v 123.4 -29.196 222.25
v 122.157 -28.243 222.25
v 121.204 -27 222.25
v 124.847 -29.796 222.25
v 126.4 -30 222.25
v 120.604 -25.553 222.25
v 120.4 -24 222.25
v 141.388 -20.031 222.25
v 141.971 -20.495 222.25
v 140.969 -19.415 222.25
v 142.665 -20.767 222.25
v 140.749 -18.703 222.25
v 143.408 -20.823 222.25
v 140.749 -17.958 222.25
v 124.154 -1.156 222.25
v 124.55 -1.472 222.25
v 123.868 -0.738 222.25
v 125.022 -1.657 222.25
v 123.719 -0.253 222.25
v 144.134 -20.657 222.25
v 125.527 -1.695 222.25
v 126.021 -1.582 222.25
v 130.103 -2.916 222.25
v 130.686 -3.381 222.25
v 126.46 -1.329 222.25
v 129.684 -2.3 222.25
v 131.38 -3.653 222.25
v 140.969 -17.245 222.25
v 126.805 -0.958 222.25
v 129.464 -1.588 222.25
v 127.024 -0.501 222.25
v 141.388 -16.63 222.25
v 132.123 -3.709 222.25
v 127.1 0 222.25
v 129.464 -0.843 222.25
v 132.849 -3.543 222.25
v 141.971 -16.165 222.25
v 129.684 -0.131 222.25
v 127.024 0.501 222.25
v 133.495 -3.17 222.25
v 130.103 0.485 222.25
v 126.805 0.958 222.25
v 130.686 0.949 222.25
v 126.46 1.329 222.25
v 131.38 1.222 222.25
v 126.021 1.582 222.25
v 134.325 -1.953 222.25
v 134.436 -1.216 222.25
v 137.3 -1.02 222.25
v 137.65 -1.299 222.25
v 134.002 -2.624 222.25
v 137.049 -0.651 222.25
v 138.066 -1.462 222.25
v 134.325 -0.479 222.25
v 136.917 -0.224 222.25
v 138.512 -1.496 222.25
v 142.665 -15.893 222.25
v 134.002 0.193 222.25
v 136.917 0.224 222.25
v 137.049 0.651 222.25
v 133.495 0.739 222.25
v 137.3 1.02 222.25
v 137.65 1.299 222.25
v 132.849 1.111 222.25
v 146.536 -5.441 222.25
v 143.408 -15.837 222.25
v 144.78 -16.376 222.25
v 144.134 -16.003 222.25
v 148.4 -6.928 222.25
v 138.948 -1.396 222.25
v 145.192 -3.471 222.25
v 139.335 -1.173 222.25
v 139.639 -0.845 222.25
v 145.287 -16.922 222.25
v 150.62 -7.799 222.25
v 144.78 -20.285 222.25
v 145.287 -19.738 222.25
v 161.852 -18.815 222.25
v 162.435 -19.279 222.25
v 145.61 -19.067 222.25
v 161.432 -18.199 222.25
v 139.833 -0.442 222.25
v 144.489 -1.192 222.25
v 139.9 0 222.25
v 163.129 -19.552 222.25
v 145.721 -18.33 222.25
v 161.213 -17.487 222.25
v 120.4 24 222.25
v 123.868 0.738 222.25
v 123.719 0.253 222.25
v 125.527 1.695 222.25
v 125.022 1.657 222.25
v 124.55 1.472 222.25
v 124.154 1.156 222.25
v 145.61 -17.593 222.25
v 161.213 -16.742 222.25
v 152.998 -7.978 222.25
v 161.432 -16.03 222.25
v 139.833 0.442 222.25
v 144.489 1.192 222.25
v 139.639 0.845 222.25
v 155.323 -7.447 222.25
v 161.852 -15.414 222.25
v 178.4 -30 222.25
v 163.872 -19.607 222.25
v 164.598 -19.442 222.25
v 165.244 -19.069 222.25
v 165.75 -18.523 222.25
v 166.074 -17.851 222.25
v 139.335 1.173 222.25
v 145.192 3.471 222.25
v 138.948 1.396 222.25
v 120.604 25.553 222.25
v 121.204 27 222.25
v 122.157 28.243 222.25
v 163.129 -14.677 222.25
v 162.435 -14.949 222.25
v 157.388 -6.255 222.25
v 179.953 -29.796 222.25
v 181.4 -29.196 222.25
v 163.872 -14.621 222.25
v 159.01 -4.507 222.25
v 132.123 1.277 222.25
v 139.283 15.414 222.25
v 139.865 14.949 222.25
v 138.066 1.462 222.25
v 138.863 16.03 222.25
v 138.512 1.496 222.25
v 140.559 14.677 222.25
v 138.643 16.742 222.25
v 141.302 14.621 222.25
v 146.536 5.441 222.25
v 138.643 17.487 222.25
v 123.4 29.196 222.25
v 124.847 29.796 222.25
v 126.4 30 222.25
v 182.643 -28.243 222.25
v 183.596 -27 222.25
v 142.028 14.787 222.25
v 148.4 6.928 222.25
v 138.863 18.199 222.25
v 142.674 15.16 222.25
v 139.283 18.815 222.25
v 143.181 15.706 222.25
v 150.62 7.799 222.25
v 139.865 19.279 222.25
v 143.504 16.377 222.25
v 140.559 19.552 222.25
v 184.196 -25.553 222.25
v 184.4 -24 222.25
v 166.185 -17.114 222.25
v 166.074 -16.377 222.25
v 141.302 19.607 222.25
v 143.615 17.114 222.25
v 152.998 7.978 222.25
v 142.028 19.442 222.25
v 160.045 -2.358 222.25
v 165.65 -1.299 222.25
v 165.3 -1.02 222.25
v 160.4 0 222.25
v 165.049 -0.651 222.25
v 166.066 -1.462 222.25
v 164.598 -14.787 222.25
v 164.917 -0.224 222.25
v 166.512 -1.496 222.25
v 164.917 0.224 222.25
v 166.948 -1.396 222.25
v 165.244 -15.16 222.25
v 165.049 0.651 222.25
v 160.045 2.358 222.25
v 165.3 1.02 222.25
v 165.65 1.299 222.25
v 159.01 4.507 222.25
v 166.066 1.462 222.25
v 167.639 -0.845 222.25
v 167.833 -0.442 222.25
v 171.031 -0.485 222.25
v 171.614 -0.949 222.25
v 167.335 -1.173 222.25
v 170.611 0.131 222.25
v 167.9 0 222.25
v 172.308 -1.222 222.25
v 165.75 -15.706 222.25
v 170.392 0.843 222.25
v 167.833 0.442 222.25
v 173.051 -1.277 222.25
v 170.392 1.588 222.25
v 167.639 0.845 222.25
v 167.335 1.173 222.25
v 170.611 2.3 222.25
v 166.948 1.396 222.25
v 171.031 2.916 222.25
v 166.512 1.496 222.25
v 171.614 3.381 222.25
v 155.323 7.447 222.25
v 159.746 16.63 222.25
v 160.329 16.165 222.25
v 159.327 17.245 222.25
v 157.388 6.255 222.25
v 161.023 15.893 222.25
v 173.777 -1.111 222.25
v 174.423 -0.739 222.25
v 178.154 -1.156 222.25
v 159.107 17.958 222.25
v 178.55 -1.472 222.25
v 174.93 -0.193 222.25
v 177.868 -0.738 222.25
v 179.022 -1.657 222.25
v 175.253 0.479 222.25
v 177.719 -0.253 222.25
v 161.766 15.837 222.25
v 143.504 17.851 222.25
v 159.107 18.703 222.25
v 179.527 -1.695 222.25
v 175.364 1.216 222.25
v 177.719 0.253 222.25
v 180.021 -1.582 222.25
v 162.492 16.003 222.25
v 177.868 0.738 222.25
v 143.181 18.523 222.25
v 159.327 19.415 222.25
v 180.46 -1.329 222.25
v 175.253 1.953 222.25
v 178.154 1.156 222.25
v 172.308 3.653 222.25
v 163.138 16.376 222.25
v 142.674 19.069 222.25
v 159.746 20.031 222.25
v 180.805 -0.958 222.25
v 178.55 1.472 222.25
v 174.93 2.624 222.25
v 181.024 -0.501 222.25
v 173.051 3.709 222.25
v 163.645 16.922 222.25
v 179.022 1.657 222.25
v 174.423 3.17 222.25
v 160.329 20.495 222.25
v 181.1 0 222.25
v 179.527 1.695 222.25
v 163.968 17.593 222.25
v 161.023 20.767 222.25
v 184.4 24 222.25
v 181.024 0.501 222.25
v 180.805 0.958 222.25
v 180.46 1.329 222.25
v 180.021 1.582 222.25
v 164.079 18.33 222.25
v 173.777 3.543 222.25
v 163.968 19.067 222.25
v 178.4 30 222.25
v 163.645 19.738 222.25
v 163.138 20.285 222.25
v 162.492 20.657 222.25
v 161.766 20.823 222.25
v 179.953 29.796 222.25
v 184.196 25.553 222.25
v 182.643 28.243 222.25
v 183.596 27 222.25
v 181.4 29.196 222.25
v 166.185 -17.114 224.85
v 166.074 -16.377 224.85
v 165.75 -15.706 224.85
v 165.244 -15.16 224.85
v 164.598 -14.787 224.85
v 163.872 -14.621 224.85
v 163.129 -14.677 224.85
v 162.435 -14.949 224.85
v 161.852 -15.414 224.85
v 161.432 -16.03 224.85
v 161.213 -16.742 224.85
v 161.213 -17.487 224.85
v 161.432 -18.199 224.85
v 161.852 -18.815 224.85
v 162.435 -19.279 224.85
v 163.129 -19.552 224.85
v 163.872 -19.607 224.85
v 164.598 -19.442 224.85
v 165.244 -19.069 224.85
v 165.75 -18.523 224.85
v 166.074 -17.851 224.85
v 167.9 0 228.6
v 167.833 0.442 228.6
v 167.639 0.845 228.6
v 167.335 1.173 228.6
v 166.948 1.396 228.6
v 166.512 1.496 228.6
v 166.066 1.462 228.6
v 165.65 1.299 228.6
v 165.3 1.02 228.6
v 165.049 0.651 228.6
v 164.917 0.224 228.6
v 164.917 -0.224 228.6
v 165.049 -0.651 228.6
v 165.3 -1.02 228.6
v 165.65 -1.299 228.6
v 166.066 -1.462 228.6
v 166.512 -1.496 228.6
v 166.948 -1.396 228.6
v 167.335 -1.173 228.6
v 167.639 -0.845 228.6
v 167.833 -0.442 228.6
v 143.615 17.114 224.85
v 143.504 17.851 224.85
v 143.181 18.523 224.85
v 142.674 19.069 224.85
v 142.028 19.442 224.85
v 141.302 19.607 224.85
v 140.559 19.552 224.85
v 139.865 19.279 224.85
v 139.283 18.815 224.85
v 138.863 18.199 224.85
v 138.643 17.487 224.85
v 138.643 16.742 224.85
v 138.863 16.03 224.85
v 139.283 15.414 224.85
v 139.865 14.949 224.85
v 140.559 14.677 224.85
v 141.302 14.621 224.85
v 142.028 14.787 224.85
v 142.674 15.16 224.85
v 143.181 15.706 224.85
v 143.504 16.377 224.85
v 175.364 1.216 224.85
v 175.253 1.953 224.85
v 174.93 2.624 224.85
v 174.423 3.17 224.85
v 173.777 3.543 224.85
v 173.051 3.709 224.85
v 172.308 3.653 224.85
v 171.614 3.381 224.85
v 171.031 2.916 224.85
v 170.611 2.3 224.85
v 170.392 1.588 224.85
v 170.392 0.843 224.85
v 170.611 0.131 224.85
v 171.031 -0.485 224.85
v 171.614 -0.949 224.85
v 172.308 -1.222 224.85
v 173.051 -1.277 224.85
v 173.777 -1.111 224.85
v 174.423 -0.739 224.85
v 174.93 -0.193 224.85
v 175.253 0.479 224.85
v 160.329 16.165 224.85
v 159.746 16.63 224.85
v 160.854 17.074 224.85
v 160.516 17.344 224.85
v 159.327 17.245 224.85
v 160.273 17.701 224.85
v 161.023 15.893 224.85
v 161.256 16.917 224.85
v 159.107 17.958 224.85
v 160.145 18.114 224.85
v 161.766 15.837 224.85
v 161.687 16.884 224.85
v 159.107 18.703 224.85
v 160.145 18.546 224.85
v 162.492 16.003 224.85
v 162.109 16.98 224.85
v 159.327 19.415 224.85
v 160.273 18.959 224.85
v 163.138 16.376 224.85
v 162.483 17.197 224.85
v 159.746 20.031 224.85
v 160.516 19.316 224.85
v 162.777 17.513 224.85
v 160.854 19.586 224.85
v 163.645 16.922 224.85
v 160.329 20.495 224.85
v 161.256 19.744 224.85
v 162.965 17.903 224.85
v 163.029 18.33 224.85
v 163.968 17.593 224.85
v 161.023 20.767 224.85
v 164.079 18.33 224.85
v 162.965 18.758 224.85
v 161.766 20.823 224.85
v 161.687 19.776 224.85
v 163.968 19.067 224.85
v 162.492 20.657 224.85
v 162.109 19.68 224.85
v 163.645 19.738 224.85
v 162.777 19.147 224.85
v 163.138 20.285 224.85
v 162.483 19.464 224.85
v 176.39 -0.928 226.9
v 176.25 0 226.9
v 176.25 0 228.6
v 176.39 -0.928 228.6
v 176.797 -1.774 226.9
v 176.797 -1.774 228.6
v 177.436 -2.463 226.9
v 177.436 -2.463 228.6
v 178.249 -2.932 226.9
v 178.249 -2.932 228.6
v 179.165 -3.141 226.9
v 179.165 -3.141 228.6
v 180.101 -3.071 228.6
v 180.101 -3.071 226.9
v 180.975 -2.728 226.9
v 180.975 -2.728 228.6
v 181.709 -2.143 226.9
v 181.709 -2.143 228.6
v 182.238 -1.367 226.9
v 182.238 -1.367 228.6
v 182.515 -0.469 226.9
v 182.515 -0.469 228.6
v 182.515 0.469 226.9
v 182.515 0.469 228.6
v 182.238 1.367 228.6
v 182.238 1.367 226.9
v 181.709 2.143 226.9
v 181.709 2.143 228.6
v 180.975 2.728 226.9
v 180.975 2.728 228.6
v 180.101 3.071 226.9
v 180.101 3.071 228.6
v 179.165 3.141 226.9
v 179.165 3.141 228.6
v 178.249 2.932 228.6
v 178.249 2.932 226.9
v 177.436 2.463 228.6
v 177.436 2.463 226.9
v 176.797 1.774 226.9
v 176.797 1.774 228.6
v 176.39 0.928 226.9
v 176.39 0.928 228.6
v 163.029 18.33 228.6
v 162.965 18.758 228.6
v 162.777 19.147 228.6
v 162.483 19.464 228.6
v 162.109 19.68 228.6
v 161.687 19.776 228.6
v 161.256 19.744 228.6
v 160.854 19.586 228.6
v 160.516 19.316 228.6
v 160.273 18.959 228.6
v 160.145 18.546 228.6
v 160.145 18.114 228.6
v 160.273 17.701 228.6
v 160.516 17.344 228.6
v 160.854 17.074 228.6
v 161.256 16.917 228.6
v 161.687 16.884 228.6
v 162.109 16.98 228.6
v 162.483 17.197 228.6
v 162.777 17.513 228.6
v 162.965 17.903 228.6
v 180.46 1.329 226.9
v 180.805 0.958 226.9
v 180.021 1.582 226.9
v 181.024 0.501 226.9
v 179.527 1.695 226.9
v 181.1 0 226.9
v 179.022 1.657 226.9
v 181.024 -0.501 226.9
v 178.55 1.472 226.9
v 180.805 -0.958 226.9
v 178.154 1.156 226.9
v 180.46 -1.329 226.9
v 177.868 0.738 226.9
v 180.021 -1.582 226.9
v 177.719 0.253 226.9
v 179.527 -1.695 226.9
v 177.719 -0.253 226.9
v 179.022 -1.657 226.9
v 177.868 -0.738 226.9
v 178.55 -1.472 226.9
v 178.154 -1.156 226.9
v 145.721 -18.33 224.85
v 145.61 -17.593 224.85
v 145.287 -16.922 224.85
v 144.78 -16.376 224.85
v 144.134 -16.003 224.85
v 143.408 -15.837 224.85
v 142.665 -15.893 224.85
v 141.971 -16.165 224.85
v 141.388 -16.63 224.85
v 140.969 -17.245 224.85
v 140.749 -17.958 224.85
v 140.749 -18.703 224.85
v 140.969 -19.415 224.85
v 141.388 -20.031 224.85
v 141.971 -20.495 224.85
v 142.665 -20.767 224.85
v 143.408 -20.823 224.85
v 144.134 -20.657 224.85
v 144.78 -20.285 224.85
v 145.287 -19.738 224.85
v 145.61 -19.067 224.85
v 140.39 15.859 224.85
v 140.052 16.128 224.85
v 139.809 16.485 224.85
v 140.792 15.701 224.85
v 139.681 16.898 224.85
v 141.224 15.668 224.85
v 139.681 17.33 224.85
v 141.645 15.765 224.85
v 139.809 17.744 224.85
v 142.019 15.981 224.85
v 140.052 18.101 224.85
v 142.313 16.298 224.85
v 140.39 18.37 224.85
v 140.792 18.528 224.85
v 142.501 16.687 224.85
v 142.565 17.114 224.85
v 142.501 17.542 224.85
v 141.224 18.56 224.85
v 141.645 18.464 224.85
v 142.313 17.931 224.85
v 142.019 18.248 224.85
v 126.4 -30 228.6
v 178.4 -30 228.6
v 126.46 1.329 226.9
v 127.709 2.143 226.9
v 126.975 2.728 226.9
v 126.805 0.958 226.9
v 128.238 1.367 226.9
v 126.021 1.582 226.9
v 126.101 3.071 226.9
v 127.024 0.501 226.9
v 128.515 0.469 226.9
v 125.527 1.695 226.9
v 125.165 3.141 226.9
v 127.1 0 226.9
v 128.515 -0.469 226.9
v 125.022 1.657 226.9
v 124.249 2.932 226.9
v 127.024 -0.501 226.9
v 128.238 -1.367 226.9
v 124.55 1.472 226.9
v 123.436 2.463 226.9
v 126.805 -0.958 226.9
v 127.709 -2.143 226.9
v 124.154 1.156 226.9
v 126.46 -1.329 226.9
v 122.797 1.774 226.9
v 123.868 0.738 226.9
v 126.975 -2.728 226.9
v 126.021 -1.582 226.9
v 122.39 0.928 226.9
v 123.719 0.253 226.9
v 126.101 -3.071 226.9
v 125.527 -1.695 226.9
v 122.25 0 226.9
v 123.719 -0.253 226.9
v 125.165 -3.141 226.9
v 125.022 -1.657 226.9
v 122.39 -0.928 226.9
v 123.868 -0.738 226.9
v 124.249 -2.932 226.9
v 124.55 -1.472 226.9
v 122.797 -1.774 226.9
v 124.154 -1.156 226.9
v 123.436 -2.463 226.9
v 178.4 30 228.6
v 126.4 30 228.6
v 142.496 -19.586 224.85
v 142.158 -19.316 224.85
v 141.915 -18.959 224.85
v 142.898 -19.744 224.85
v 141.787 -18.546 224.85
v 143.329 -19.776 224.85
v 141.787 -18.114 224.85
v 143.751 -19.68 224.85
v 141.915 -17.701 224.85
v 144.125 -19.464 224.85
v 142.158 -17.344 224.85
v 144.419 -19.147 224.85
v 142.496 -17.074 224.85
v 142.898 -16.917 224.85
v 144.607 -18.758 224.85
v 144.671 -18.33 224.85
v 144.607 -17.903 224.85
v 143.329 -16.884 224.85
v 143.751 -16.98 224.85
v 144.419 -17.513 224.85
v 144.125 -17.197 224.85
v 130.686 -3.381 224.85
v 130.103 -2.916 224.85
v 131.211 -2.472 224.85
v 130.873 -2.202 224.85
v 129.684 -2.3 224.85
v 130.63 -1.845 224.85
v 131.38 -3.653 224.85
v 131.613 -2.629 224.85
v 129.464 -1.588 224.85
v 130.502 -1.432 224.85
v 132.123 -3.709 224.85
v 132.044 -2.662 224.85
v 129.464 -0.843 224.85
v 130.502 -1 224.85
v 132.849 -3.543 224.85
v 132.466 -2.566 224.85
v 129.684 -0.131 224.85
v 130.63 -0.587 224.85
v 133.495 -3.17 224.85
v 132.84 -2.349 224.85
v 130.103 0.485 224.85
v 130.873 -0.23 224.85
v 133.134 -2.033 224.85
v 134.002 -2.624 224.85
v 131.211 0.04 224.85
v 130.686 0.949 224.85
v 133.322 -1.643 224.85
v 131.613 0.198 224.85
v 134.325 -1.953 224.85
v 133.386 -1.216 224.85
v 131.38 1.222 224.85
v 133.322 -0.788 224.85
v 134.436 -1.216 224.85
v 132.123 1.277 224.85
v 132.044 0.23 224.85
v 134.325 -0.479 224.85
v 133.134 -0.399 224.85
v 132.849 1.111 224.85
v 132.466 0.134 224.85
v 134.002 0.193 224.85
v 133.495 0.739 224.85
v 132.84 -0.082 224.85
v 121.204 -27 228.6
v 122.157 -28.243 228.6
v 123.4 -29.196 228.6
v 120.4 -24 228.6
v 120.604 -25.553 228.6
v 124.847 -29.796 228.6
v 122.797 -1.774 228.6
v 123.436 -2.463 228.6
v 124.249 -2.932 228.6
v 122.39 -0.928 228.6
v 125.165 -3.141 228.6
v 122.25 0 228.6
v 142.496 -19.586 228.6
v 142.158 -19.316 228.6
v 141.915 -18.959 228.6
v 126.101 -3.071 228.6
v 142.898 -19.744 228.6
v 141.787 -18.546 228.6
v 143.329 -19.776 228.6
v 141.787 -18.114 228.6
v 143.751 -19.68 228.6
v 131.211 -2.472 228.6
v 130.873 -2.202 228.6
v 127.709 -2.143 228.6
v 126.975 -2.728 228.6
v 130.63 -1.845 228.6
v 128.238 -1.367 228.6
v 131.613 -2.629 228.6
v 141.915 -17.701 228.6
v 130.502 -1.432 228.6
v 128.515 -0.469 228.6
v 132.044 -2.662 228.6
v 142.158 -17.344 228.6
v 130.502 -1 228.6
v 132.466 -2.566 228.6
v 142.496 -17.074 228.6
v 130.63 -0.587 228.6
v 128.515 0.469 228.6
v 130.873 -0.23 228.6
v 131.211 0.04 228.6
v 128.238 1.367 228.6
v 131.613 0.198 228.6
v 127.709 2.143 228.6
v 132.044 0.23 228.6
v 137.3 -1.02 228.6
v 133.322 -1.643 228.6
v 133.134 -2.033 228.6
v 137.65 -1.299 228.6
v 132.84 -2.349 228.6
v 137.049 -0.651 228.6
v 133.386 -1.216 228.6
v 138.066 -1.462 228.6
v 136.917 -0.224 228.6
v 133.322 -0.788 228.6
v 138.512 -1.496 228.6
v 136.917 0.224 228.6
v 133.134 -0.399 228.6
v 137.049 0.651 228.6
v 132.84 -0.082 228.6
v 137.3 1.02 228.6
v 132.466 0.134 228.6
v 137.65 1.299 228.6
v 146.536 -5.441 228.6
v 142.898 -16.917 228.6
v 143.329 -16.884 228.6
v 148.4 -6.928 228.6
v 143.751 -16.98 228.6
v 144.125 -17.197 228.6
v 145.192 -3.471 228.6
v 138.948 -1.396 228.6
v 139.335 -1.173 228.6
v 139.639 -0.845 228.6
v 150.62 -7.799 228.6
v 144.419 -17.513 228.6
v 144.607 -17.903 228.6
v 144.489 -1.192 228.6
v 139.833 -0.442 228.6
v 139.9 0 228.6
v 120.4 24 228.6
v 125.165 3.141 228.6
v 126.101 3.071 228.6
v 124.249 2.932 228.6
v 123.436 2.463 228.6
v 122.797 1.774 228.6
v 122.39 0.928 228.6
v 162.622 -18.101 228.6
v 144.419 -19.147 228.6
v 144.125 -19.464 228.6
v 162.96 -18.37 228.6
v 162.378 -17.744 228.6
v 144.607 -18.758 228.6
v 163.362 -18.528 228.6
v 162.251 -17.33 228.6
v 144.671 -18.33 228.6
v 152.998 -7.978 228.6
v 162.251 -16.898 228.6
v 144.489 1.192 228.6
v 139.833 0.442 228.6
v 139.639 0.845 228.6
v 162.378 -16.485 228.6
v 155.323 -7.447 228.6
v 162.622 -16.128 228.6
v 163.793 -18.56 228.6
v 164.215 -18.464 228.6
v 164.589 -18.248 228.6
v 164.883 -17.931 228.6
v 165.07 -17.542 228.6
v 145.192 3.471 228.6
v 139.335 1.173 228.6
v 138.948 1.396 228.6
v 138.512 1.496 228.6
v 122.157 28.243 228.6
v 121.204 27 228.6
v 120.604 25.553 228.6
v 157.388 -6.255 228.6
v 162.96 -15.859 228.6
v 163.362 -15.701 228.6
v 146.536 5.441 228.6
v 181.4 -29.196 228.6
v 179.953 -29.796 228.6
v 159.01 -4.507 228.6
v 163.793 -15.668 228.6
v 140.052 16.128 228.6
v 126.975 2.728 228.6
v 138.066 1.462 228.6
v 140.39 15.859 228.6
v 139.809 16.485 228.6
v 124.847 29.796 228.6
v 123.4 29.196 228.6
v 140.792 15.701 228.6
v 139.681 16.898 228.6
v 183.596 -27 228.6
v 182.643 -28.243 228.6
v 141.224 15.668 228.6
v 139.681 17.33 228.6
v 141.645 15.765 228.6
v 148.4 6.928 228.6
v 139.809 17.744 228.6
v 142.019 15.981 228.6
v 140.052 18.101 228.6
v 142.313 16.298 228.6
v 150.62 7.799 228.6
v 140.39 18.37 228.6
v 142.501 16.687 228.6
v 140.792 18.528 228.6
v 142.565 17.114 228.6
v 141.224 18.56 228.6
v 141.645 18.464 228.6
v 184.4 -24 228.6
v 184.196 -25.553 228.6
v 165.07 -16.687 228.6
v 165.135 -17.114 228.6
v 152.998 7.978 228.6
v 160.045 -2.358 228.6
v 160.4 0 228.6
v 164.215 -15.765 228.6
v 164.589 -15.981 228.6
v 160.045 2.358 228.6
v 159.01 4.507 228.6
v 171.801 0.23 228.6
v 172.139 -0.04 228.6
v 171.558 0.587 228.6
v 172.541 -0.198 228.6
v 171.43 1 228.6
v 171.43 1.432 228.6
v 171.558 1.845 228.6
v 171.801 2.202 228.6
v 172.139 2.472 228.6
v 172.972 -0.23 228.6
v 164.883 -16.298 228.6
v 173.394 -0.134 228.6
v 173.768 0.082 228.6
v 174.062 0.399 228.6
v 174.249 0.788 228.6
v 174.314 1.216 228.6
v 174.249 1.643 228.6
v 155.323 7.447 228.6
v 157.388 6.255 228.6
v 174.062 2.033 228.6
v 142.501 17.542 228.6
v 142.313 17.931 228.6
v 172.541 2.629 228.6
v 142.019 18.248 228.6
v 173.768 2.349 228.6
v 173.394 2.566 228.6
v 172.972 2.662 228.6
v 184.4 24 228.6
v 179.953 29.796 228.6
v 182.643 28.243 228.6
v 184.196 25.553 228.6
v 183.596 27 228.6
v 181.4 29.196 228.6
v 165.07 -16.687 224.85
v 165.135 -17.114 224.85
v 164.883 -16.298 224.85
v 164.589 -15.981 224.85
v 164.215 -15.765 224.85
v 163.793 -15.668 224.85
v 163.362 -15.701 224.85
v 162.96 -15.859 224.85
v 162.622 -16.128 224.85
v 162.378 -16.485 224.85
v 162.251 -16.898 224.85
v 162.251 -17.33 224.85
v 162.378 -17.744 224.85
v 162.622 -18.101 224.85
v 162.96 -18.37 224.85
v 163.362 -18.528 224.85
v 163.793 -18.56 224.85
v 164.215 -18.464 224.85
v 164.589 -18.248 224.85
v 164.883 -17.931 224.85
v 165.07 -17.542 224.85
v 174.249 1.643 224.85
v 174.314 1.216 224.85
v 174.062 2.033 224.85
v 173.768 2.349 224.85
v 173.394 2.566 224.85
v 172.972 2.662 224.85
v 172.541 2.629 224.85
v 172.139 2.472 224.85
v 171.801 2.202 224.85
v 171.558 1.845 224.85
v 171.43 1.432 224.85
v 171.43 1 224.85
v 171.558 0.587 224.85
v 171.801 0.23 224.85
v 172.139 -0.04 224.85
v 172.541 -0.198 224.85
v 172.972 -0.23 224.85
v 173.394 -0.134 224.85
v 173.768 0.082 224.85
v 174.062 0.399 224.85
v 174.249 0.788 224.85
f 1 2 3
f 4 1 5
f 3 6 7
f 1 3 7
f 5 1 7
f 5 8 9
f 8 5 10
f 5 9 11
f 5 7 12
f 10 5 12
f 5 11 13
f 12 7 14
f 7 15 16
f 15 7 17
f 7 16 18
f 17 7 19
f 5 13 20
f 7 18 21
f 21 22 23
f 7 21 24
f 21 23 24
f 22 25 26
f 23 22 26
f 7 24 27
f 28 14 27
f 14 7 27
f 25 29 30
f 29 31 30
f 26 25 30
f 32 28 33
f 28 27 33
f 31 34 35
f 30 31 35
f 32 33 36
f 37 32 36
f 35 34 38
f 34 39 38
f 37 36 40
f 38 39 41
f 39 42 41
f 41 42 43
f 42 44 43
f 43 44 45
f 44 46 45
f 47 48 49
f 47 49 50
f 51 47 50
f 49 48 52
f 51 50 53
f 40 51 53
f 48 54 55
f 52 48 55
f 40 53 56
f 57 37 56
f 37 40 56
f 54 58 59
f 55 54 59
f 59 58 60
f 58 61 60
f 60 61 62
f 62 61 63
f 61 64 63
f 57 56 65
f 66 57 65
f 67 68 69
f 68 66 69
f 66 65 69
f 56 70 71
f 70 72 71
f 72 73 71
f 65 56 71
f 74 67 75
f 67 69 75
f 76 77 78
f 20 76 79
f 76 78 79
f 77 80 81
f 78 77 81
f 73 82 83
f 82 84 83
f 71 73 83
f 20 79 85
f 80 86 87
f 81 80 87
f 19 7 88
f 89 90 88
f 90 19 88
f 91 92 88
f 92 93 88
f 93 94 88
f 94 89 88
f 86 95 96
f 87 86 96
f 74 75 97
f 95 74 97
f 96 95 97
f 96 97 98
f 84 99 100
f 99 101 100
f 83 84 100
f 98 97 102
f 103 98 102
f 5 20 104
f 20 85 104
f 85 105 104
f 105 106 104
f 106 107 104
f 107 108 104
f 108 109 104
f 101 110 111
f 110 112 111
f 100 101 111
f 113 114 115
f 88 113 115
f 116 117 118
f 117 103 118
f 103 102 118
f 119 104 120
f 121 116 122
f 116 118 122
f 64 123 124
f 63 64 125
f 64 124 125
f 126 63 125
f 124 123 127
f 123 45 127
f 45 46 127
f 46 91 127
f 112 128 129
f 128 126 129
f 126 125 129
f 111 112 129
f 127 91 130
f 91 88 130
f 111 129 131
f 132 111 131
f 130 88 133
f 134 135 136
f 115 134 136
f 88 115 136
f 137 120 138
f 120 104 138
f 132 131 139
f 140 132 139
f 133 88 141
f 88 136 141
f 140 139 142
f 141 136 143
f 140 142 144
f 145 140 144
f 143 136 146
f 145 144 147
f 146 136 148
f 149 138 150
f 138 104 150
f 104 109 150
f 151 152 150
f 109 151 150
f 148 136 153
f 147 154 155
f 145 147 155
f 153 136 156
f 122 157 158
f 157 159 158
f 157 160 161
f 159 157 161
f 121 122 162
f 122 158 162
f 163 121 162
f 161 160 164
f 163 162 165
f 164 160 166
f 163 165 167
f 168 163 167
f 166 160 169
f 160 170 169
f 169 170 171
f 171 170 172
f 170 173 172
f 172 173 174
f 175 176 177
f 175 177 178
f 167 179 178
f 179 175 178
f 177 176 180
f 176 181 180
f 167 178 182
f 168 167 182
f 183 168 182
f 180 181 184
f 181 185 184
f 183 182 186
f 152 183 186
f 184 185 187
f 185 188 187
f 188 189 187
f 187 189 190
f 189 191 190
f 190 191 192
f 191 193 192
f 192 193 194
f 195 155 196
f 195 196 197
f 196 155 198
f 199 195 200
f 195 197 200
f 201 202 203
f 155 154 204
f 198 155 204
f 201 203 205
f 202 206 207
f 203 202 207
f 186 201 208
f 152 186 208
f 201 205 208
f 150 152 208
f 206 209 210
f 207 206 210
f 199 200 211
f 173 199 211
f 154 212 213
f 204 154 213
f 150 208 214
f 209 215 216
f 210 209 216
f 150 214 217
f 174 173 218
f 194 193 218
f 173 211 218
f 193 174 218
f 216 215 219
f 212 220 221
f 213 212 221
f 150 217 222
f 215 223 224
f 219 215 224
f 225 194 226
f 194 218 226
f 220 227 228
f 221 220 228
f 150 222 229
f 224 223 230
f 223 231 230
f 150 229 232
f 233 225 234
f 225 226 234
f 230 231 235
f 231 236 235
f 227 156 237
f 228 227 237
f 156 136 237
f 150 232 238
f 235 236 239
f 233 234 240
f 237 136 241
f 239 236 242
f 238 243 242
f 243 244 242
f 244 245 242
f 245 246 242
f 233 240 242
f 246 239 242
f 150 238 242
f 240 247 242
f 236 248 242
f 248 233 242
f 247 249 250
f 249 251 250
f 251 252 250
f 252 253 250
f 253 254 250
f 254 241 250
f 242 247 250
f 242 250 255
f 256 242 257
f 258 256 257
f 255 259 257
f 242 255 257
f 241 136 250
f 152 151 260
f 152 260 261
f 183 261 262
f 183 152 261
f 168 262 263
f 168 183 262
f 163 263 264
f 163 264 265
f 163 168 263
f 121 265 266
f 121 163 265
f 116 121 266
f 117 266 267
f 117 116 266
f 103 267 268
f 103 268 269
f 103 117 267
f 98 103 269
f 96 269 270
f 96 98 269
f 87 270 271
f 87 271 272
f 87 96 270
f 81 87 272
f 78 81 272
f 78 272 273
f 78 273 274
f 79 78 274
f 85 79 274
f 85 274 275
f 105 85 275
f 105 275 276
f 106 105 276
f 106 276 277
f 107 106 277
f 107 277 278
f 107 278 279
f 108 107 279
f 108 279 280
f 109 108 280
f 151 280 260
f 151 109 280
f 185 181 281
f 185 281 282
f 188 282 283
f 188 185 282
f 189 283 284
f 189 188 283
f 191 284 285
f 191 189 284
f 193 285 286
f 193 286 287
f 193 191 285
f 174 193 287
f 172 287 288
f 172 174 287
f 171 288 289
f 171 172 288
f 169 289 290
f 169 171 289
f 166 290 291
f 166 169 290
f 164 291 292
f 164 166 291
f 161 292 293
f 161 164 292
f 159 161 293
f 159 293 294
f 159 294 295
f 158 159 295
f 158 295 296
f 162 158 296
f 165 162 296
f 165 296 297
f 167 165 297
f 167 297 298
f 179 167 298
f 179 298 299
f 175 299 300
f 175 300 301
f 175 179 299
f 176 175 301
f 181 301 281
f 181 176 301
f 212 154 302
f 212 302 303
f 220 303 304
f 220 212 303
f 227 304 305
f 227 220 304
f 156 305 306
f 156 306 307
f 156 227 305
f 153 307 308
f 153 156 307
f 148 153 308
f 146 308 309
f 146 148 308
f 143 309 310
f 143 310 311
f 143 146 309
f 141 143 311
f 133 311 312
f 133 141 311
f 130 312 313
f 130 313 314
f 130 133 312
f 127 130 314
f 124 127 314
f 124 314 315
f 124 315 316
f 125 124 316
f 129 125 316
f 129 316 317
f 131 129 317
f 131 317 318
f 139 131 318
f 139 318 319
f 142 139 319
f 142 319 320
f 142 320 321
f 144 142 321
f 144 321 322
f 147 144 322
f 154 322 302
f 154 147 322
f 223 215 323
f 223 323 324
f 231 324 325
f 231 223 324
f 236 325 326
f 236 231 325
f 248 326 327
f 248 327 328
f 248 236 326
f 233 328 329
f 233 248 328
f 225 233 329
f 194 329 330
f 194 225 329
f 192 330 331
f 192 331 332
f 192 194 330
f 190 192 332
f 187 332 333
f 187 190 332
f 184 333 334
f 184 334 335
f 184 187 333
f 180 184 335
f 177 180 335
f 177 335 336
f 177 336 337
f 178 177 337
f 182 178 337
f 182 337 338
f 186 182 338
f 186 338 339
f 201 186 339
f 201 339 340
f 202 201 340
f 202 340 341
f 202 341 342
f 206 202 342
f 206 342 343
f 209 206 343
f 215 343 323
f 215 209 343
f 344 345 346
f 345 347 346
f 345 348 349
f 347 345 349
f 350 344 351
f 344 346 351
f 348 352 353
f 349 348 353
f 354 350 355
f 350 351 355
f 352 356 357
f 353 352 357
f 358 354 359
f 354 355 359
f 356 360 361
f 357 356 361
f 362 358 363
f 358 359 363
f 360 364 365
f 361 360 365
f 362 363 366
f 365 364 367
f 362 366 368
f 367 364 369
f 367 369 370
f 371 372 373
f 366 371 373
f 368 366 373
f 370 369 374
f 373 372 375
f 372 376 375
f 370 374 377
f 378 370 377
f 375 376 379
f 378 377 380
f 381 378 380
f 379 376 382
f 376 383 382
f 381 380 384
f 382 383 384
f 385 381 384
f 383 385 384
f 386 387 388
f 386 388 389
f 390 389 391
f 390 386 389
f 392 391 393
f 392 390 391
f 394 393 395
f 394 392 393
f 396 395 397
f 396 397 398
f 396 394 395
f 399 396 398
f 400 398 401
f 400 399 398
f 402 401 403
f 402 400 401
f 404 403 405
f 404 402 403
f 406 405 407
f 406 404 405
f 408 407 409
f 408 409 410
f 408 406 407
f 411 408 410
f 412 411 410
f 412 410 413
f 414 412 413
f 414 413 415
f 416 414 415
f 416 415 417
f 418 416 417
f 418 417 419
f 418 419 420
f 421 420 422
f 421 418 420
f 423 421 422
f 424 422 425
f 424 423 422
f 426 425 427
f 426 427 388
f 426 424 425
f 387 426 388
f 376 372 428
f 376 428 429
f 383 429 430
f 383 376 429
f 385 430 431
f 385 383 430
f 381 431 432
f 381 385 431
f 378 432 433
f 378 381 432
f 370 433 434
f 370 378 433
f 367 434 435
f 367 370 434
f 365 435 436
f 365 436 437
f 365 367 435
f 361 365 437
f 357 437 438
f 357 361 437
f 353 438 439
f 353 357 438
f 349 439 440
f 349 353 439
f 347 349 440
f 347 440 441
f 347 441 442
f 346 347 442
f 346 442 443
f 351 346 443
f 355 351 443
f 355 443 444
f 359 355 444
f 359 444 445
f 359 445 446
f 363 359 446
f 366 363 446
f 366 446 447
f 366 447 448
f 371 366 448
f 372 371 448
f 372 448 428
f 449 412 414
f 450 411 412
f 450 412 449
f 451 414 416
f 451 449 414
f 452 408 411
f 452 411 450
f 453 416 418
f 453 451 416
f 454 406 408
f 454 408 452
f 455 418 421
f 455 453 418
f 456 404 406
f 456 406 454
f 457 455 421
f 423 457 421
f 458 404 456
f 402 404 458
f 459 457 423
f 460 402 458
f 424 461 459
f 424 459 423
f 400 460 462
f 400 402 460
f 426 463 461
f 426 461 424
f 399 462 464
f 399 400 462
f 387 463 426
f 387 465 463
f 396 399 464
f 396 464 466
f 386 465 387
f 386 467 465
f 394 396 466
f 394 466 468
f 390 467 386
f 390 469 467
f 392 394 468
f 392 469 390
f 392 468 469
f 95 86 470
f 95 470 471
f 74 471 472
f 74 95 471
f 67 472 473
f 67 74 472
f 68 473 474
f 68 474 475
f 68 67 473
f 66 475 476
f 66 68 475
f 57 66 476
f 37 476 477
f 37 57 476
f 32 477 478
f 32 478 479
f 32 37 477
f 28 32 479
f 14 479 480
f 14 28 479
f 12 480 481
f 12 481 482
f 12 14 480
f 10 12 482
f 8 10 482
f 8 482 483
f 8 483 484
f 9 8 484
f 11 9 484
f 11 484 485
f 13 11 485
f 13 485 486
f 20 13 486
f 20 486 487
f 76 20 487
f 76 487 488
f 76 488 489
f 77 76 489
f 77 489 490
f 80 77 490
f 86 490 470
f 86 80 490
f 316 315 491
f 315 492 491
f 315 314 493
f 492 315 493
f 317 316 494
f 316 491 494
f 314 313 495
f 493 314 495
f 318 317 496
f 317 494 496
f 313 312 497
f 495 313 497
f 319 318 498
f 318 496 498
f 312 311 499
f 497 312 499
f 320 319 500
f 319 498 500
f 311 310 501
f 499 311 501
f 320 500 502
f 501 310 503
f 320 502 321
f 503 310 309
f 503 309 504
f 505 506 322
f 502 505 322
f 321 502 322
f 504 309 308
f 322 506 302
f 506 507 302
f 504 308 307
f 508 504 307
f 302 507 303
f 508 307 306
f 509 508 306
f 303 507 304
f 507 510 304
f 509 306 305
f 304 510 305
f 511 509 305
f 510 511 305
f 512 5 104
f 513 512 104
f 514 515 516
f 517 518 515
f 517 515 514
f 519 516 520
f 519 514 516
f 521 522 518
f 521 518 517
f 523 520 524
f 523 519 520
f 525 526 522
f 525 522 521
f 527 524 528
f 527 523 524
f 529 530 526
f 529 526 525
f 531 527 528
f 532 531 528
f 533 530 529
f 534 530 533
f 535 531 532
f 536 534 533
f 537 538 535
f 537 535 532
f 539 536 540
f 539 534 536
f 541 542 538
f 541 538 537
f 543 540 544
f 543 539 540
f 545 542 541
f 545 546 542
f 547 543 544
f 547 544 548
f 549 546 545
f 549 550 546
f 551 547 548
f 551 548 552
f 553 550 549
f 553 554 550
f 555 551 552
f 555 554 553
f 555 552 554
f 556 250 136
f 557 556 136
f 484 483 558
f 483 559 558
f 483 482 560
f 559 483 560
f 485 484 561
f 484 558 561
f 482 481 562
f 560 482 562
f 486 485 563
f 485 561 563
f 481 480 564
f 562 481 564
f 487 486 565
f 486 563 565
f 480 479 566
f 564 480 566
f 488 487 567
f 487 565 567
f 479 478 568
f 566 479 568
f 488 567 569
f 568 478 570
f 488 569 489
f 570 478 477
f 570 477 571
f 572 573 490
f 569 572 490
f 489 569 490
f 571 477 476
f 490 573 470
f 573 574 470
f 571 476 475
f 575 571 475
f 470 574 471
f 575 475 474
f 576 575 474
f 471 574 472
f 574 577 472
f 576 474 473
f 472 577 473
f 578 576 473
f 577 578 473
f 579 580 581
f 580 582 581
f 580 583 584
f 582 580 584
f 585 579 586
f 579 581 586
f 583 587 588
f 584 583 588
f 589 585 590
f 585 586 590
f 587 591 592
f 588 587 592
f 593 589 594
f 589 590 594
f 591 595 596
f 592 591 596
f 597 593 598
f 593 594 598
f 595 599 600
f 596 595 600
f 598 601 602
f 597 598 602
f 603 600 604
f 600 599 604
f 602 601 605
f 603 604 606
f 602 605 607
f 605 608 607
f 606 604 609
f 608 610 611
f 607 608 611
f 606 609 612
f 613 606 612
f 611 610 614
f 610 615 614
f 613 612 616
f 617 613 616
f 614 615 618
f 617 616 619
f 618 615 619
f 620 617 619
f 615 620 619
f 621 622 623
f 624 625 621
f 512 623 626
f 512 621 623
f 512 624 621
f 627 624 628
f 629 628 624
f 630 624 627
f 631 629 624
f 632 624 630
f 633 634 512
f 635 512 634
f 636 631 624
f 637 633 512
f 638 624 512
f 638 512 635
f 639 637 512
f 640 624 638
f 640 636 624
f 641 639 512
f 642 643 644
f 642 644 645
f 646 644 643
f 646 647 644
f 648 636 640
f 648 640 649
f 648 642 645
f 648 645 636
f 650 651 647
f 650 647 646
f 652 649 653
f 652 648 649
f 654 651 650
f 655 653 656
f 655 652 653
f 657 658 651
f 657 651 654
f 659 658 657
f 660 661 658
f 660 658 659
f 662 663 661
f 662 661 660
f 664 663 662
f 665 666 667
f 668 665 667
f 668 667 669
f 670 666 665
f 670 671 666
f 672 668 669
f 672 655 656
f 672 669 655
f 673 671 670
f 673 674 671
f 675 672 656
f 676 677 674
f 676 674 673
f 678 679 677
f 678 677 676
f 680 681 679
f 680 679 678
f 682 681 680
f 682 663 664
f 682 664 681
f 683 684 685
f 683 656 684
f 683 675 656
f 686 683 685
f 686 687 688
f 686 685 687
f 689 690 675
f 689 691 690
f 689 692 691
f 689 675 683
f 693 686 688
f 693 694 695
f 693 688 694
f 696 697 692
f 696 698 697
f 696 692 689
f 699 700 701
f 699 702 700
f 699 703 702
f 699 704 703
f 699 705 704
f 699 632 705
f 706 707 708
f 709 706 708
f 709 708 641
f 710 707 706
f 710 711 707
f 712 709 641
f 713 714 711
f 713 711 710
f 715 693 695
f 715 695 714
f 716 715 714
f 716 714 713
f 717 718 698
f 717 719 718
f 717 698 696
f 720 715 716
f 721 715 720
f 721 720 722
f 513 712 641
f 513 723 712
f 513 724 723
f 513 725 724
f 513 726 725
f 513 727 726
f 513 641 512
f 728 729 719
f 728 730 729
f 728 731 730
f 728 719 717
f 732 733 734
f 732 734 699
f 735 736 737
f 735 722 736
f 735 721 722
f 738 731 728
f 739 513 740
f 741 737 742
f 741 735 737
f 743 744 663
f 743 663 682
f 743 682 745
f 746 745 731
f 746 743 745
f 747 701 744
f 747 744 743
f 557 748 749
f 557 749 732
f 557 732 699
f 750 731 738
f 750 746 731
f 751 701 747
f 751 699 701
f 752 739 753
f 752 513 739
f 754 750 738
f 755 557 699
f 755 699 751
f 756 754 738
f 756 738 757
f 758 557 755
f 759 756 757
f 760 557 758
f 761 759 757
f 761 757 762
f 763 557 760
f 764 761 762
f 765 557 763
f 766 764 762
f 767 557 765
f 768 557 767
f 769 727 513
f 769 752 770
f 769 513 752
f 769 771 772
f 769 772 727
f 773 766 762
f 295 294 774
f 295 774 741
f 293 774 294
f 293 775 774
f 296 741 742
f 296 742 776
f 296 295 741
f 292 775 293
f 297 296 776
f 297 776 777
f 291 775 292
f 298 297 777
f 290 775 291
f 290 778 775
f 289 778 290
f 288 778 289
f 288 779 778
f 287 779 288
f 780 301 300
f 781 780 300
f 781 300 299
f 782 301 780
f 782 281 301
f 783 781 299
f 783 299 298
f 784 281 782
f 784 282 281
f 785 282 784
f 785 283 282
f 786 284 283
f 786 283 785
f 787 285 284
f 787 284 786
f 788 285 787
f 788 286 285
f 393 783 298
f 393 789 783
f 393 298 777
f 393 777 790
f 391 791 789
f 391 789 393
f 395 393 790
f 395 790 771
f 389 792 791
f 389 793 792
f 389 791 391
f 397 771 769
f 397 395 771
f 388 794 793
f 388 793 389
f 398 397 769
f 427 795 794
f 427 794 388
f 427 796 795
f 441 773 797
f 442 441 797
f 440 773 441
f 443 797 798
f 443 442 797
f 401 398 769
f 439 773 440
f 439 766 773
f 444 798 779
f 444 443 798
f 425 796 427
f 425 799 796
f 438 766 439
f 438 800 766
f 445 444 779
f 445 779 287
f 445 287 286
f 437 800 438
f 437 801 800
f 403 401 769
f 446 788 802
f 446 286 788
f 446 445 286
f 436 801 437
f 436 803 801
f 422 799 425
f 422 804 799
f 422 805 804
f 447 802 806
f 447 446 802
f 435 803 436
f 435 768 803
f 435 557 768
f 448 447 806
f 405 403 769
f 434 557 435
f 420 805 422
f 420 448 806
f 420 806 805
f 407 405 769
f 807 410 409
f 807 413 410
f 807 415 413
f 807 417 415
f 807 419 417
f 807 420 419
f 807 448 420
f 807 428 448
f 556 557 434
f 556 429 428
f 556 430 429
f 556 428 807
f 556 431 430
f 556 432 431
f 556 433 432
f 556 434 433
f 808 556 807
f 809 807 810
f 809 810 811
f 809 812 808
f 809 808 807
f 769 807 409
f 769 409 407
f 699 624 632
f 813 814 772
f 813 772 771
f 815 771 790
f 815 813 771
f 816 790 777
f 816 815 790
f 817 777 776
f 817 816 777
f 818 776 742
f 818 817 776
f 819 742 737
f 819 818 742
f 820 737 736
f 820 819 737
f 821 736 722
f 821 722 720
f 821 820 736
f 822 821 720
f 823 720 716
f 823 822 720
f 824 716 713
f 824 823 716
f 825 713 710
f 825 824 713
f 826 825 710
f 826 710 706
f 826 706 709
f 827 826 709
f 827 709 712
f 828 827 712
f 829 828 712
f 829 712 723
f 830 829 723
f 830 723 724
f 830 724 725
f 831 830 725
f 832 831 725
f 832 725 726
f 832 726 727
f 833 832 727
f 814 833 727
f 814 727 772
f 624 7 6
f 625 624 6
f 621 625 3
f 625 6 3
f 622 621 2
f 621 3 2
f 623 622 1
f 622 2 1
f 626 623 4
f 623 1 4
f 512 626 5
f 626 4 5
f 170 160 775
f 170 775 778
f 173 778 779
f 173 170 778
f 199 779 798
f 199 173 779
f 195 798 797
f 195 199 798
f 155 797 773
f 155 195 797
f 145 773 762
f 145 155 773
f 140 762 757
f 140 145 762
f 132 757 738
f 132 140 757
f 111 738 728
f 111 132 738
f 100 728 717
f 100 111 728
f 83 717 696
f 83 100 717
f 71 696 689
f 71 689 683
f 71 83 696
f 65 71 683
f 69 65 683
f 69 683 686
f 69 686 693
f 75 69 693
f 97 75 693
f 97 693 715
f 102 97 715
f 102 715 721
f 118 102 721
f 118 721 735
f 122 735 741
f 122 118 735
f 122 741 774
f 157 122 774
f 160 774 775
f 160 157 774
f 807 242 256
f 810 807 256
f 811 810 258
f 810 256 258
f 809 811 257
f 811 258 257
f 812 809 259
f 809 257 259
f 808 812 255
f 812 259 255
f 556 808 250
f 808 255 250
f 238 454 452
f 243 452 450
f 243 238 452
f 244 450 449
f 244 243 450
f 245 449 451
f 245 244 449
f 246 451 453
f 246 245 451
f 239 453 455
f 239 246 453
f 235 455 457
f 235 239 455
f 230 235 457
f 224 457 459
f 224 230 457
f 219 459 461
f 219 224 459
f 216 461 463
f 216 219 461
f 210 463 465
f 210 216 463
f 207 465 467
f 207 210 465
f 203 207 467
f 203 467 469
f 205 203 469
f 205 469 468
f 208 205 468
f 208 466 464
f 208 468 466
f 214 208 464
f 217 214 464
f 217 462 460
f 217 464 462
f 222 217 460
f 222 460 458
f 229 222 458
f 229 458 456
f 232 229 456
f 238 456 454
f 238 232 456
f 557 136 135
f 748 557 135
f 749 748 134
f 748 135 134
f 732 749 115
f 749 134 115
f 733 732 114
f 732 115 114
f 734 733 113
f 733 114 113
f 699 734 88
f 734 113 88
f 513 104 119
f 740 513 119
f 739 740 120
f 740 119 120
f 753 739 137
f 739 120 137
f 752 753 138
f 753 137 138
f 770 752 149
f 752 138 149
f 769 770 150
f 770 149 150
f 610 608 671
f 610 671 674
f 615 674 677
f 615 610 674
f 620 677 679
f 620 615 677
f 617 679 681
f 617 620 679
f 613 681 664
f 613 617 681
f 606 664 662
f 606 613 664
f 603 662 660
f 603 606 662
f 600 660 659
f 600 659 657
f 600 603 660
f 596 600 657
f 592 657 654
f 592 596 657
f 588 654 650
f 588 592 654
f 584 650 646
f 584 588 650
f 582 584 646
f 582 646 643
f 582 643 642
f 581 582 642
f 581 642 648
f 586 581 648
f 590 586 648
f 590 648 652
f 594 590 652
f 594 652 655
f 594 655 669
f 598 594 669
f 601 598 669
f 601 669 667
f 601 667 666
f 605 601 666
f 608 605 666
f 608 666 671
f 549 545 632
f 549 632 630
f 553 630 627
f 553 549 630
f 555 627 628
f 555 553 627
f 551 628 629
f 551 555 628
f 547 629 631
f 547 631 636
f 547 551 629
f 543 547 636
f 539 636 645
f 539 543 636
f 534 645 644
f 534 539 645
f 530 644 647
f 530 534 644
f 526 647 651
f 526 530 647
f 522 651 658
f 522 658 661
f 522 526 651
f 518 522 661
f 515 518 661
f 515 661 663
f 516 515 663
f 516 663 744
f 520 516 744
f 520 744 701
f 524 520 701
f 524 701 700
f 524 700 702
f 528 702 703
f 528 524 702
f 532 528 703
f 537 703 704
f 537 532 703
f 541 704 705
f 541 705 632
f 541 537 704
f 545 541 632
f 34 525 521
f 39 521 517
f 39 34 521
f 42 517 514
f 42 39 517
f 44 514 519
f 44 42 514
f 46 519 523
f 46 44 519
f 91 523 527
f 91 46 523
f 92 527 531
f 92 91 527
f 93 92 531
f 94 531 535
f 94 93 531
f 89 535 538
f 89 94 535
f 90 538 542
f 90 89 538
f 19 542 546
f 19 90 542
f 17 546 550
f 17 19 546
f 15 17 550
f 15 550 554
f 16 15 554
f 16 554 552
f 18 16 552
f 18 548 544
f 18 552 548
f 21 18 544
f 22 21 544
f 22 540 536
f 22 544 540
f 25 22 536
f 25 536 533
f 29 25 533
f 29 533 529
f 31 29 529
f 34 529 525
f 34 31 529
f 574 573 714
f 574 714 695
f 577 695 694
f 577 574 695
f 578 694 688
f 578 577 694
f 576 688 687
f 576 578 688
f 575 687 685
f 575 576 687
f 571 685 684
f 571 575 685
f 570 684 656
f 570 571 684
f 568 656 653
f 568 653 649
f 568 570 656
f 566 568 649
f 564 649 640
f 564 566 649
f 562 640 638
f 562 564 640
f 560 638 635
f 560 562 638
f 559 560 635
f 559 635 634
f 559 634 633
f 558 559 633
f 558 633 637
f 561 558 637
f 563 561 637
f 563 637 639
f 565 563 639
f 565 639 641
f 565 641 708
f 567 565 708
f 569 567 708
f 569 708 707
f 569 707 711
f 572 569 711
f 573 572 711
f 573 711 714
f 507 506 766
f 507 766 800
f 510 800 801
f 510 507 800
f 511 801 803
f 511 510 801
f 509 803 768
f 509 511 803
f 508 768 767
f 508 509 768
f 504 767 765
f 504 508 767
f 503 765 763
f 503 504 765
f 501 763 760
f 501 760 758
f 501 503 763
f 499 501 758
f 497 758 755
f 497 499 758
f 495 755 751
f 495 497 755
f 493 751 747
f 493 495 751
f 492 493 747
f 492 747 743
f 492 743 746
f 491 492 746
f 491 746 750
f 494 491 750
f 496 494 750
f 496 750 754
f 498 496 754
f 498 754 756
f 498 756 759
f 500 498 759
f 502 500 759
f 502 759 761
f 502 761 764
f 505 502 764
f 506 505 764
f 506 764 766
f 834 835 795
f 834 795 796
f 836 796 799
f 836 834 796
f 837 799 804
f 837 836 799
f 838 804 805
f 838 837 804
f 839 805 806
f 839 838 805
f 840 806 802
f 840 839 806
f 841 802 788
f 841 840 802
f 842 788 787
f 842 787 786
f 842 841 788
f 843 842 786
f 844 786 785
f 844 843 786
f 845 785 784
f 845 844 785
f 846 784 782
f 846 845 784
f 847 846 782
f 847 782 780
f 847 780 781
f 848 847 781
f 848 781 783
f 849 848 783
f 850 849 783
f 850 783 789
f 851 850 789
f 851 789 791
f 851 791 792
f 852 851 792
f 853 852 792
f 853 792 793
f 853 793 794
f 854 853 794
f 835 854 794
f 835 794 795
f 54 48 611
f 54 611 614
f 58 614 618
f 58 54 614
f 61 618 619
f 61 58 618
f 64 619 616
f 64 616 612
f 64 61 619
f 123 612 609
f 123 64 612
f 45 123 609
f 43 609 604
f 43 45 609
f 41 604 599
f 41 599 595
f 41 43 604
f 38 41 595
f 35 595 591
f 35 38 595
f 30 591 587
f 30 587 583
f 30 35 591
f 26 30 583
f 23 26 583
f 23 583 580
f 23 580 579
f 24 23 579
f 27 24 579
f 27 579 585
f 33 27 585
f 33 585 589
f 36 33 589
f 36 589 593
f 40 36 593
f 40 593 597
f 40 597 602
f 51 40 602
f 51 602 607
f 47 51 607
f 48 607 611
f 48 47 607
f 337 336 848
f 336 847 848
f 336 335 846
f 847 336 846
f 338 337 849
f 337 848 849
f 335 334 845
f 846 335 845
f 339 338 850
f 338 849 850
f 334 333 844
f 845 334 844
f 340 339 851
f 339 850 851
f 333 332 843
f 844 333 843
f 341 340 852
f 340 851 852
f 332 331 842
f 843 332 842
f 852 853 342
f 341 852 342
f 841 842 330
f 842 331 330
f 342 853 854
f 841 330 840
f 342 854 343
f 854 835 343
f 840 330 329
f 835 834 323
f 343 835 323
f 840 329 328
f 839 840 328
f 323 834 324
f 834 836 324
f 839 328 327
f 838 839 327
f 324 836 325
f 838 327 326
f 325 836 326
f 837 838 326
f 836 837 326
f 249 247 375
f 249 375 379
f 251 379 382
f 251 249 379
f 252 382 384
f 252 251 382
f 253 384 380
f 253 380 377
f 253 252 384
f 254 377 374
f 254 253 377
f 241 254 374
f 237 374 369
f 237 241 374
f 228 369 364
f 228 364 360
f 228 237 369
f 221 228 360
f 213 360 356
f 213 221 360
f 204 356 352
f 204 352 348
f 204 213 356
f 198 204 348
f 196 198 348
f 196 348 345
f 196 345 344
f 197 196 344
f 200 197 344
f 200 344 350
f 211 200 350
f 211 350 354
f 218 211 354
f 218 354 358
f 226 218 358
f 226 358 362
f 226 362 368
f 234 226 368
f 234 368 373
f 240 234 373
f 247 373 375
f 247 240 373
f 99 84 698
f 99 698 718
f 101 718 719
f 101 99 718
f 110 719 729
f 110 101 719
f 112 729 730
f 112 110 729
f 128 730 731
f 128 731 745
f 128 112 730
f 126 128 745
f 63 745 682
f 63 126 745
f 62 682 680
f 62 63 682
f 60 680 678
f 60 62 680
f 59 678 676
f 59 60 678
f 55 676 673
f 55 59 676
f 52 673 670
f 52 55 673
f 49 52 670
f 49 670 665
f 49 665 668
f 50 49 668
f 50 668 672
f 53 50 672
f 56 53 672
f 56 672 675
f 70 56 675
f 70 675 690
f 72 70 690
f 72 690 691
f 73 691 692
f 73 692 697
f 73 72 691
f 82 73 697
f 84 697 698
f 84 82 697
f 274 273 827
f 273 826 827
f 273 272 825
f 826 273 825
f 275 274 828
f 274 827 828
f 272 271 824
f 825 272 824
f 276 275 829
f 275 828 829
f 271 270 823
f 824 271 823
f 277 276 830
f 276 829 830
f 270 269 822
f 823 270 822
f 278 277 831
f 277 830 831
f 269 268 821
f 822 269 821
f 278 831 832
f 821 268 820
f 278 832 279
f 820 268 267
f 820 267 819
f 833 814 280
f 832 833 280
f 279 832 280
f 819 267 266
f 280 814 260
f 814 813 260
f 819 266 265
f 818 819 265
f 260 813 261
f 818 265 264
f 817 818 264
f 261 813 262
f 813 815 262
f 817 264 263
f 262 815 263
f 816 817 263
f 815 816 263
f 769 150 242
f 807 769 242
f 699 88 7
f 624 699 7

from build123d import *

# Parameters (mm, degrees)
REPISA_M4_START                       = 222.25
REPISA_M4_DEPTH                       = 6.35
BARRENOS_M4_TORNILLOS_PASADORES_START = 222.25
CROQUIS2_R                            = 1.45
CROQUIS2_R_2                          = 8
CROQUIS2_R_3                          = 1.7
CROQUIS2_R_4                          = 1.5
BARRENOS_M4_TORNILLOS_PASADORES_DEPTH = 6.35
REFRENTADO_M2_5_START                 = 222.25
CROQUIS3_R                            = 2.5
REFRENTADO_M2_5_DEPTH                 = 2.6
AVELLANADO_M3_START                   = 226.9
CROQUIS4_R                            = 3.15
AVELLANADO_M3_DEPTH                   = 1.7


with BuildPart() as part:
    # Croquis1 → Repisa_M4 (new body)
    with BuildSketch(Plane.XY.offset(REPISA_M4_START)):
        with BuildLine():
            Line((126.4, -30), (178.4, -30))
            ThreePointArc((178.4, -30), (182.642640687, -28.242640687), (184.4, -24))
            Line((184.4, -24), (184.4, 24))
            ThreePointArc((184.4, 24), (182.642640687, 28.242640687), (178.4, 30))
            Line((178.4, 30), (126.4, 30))
            ThreePointArc((126.4, 30), (122.157359313, 28.242640687), (120.4, 24))
            Line((120.4, 24), (120.4, -24))
            ThreePointArc((120.4, -24), (122.157359313, -28.242640687), (126.4, -30))
        make_face()
    extrude(amount=REPISA_M4_DEPTH)

    # Croquis2 → Barrenos_M4_tornillos_pasadores (cut)
    with BuildSketch(Plane.XY.offset(BARRENOS_M4_TORNILLOS_PASADORES_START)):
        with Locations((172.863916472, 1.215780658)):
            Circle(CROQUIS2_R)
        with Locations((161.579061301, 18.330161855)):
            Circle(CROQUIS2_R)
        with Locations((141.115144828, 17.114381197)):
            Circle(CROQUIS2_R)
        with Locations((131.936083528, -1.215780658)):
            Circle(CROQUIS2_R)
        with Locations((143.220938699, -18.330161855)):
            Circle(CROQUIS2_R)
        with Locations((163.684855172, -17.114381197)):
            Circle(CROQUIS2_R)
        with Locations((152.4, 0)):
            Circle(CROQUIS2_R_2)
        with Locations((125.4, 0)):
            Circle(CROQUIS2_R_3)
        with Locations((179.4, 0)):
            Circle(CROQUIS2_R_3)
        with Locations((138.4, 0)):
            Circle(CROQUIS2_R_4)
        with Locations((166.4, 0)):
            Circle(CROQUIS2_R_4)
    extrude(amount=BARRENOS_M4_TORNILLOS_PASADORES_DEPTH, mode=Mode.SUBTRACT)

    # Croquis3 → Refrentado_M2-5 (cut)
    with BuildSketch(Plane.XY.offset(REFRENTADO_M2_5_START)):
        with Locations((172.863916472, 1.215780658)):
            Circle(CROQUIS3_R)
        with Locations((161.579061301, 18.330161855)):
            Circle(CROQUIS3_R)
        with Locations((141.115144828, 17.114381197)):
            Circle(CROQUIS3_R)
        with Locations((131.936083528, -1.215780658)):
            Circle(CROQUIS3_R)
        with Locations((143.220938699, -18.330161855)):
            Circle(CROQUIS3_R)
        with Locations((163.684855172, -17.114381197)):
            Circle(CROQUIS3_R)
    extrude(amount=REFRENTADO_M2_5_DEPTH, mode=Mode.SUBTRACT)

    # Croquis4 → Avellanado_M3 (cut)
    with BuildSketch(Plane.XY.offset(AVELLANADO_M3_START)):
        with Locations(Location((125.4, 0, 0), (0, 0, 180))):
            Circle(CROQUIS4_R)
        with Locations(Location((179.4, 0, 0), (0, 0, 180))):
            Circle(CROQUIS4_R)
    extrude(amount=AVELLANADO_M3_DEPTH, mode=Mode.SUBTRACT)


solid = part.part
